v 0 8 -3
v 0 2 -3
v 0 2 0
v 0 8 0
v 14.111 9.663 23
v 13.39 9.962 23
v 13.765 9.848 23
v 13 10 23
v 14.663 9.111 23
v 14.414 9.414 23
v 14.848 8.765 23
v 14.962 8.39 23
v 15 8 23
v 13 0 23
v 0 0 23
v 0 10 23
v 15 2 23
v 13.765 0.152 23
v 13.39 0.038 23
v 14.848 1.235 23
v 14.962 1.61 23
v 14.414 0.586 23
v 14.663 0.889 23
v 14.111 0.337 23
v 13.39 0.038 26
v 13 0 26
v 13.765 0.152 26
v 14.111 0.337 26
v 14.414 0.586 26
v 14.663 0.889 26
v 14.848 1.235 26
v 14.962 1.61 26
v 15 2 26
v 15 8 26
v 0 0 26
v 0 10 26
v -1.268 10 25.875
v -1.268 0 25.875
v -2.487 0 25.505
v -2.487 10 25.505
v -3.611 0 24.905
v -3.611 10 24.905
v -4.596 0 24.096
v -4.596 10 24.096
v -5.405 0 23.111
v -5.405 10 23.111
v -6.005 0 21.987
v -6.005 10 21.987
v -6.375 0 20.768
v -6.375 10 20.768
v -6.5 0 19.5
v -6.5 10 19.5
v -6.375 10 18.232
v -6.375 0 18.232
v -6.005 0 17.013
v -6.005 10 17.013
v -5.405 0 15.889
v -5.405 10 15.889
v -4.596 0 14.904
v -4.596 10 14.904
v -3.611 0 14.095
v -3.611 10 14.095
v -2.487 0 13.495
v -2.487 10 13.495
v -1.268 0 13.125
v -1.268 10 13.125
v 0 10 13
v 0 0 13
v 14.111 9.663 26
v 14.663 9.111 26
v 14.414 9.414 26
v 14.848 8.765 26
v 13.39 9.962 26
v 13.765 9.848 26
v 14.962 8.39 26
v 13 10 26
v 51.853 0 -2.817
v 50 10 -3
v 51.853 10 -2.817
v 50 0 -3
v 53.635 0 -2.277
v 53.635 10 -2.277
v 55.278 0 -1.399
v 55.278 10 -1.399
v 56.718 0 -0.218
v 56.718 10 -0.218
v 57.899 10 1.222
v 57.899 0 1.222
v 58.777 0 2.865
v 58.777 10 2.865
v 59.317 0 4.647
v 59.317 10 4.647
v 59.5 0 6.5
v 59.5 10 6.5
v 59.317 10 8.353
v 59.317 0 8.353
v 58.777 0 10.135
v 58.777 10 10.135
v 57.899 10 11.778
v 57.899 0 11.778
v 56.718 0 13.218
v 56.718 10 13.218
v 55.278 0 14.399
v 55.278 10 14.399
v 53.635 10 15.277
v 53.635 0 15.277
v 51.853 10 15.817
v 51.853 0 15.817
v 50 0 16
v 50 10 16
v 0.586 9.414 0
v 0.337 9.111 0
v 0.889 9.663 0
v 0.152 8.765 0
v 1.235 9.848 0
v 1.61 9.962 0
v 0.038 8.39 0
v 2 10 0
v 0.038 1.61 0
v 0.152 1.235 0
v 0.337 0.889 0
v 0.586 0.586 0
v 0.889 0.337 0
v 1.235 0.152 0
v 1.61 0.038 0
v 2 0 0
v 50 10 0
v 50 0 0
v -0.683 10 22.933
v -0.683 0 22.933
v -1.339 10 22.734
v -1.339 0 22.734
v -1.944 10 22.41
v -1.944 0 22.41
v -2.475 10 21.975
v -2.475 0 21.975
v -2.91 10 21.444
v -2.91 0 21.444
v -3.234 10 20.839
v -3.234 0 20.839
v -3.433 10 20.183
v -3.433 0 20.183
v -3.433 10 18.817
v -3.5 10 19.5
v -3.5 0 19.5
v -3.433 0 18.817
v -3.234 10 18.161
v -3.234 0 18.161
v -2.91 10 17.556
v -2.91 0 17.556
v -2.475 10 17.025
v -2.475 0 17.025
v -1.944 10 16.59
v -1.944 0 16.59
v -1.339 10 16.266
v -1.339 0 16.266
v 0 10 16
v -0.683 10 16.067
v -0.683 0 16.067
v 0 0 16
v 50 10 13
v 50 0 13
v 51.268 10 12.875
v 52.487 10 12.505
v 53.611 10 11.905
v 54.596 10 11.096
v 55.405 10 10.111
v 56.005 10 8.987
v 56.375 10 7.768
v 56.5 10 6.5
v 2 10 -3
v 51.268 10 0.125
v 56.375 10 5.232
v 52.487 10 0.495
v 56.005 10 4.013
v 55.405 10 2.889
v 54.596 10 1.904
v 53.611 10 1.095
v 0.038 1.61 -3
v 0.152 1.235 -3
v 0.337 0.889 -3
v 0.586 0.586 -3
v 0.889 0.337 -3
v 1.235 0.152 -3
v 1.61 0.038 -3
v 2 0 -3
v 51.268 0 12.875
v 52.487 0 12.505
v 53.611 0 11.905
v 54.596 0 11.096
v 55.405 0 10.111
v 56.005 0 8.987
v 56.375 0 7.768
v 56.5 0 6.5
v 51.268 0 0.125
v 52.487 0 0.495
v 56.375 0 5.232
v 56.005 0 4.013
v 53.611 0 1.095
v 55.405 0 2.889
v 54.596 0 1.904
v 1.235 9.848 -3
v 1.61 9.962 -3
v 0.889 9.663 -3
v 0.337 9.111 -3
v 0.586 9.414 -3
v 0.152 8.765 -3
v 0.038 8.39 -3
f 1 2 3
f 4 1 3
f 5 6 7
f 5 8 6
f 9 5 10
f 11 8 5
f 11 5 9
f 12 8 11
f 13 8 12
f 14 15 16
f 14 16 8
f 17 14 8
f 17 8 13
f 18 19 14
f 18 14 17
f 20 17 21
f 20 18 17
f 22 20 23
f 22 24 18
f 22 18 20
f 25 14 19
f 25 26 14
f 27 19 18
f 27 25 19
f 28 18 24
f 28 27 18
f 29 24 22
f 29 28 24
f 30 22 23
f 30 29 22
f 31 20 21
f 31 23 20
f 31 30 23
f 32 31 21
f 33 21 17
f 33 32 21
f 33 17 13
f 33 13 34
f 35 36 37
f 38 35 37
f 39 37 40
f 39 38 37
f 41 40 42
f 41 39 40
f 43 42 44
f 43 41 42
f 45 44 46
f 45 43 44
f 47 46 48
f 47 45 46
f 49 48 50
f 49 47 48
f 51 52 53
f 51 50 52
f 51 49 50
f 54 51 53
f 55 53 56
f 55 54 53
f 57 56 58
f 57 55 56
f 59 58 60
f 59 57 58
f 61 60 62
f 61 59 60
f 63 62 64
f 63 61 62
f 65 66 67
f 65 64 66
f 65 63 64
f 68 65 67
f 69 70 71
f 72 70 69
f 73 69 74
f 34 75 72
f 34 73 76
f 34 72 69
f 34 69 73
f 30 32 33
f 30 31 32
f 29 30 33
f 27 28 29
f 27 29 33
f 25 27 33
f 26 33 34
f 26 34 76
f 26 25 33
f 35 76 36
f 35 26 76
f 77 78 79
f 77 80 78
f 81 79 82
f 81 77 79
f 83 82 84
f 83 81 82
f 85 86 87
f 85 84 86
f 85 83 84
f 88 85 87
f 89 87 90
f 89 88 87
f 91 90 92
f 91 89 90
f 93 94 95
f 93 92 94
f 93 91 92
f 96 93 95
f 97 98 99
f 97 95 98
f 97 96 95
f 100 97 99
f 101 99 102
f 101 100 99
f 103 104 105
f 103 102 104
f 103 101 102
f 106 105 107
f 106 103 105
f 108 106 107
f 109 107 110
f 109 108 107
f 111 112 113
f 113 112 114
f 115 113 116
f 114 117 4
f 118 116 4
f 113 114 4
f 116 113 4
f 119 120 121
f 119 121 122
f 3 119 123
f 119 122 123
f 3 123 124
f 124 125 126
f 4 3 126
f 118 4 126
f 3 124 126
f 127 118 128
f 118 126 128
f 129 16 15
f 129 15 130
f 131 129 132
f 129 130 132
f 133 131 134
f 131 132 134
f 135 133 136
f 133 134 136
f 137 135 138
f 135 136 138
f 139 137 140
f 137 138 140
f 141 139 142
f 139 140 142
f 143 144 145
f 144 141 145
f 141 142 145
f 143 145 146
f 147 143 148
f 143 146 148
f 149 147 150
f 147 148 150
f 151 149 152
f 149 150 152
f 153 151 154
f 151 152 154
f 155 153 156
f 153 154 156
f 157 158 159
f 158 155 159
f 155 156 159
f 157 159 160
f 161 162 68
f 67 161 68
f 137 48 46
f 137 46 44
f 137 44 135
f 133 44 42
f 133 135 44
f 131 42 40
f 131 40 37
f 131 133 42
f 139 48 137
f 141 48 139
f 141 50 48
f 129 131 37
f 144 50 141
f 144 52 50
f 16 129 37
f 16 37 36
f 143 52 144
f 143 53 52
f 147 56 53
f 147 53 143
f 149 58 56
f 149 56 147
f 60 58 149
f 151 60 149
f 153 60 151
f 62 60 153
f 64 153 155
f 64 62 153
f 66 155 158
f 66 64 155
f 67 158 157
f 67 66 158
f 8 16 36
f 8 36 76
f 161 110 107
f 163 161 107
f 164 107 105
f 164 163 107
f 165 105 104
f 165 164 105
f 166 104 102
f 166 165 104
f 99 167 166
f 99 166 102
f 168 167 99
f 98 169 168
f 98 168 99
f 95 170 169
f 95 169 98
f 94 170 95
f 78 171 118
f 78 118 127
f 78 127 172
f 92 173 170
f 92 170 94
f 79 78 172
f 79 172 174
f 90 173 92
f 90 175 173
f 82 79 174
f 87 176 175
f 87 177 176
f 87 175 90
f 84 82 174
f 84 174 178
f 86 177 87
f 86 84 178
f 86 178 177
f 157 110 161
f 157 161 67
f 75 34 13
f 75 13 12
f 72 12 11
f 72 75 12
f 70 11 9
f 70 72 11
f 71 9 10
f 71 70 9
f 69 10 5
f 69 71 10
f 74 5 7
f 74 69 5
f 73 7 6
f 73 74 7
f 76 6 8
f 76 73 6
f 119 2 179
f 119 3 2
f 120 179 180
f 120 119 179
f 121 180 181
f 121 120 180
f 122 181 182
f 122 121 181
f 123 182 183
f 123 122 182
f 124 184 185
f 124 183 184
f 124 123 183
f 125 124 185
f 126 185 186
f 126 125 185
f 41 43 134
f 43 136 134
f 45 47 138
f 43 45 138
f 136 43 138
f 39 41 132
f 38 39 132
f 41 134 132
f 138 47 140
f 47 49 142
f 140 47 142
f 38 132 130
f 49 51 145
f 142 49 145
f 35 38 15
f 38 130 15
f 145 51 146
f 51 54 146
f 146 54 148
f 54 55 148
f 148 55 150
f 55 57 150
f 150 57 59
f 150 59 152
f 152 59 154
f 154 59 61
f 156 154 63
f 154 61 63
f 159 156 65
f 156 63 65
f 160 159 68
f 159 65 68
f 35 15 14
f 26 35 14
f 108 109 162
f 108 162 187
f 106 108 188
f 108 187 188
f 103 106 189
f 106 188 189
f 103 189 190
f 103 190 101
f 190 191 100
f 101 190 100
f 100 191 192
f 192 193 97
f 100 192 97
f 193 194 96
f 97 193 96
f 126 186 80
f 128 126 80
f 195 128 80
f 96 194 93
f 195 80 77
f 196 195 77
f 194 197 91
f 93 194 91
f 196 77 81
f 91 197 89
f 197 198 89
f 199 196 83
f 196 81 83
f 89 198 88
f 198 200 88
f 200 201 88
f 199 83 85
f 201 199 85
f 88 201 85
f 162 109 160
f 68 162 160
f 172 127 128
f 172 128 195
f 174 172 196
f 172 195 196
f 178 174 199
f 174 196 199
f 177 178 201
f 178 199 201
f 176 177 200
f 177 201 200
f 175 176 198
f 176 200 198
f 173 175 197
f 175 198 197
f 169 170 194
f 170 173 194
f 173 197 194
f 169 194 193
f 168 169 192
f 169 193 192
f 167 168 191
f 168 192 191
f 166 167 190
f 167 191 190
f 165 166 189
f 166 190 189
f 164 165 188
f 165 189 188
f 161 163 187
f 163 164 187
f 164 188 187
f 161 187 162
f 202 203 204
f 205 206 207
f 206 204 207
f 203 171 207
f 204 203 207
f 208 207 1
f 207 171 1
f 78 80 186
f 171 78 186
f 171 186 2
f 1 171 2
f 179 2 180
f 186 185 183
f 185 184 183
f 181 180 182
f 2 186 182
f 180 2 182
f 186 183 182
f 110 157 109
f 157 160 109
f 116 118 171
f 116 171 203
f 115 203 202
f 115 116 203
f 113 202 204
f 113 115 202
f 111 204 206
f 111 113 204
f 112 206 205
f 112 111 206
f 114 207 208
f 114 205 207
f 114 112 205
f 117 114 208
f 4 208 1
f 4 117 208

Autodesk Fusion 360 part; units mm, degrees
sketch "Sketch1" plane through (0, 0, 0) normal (0, 1, 0) x (1, 0, 0)
  line L0 (0, 0) -> (50, 0)
  line L1 (50, 3) -> (0, 3)
  line L2 (0, 3) -> (0, 0)
  line L3 (50, -13) -> (0, -13)
  line L4 (0, -16) -> (50, -16)
  line L5 (0, -23) -> (15, -23)
  line L6 (15, -23) -> (15, -26)
  line L7 (15, -26) -> (0, -26)
  arc A0 (0, -13) -> (0, -26) centre (0, -19.5) ccw
  arc A1 (0, -16) -> (0, -23) centre (0, -19.5) ccw
  arc A2 (50, -16) -> (50, 3) centre (50, -6.5) ccw
  arc A3 (50, -13) -> (50, 0) centre (50, -6.5) ccw
extrude "Extrude1" add sketch "Sketch1" along normal blind 10
fillet "Fillet1" radius 2 1 edges at (15, 0, 24.5)
fillet "Fillet2" radius 2 1 edges at (15, 10, 24.5)
fillet "Fillet3" radius 2 1 edges at (0, 0, -1.5)
fillet "Fillet4" radius 2 1 edges at (0, 10, -1.5)
